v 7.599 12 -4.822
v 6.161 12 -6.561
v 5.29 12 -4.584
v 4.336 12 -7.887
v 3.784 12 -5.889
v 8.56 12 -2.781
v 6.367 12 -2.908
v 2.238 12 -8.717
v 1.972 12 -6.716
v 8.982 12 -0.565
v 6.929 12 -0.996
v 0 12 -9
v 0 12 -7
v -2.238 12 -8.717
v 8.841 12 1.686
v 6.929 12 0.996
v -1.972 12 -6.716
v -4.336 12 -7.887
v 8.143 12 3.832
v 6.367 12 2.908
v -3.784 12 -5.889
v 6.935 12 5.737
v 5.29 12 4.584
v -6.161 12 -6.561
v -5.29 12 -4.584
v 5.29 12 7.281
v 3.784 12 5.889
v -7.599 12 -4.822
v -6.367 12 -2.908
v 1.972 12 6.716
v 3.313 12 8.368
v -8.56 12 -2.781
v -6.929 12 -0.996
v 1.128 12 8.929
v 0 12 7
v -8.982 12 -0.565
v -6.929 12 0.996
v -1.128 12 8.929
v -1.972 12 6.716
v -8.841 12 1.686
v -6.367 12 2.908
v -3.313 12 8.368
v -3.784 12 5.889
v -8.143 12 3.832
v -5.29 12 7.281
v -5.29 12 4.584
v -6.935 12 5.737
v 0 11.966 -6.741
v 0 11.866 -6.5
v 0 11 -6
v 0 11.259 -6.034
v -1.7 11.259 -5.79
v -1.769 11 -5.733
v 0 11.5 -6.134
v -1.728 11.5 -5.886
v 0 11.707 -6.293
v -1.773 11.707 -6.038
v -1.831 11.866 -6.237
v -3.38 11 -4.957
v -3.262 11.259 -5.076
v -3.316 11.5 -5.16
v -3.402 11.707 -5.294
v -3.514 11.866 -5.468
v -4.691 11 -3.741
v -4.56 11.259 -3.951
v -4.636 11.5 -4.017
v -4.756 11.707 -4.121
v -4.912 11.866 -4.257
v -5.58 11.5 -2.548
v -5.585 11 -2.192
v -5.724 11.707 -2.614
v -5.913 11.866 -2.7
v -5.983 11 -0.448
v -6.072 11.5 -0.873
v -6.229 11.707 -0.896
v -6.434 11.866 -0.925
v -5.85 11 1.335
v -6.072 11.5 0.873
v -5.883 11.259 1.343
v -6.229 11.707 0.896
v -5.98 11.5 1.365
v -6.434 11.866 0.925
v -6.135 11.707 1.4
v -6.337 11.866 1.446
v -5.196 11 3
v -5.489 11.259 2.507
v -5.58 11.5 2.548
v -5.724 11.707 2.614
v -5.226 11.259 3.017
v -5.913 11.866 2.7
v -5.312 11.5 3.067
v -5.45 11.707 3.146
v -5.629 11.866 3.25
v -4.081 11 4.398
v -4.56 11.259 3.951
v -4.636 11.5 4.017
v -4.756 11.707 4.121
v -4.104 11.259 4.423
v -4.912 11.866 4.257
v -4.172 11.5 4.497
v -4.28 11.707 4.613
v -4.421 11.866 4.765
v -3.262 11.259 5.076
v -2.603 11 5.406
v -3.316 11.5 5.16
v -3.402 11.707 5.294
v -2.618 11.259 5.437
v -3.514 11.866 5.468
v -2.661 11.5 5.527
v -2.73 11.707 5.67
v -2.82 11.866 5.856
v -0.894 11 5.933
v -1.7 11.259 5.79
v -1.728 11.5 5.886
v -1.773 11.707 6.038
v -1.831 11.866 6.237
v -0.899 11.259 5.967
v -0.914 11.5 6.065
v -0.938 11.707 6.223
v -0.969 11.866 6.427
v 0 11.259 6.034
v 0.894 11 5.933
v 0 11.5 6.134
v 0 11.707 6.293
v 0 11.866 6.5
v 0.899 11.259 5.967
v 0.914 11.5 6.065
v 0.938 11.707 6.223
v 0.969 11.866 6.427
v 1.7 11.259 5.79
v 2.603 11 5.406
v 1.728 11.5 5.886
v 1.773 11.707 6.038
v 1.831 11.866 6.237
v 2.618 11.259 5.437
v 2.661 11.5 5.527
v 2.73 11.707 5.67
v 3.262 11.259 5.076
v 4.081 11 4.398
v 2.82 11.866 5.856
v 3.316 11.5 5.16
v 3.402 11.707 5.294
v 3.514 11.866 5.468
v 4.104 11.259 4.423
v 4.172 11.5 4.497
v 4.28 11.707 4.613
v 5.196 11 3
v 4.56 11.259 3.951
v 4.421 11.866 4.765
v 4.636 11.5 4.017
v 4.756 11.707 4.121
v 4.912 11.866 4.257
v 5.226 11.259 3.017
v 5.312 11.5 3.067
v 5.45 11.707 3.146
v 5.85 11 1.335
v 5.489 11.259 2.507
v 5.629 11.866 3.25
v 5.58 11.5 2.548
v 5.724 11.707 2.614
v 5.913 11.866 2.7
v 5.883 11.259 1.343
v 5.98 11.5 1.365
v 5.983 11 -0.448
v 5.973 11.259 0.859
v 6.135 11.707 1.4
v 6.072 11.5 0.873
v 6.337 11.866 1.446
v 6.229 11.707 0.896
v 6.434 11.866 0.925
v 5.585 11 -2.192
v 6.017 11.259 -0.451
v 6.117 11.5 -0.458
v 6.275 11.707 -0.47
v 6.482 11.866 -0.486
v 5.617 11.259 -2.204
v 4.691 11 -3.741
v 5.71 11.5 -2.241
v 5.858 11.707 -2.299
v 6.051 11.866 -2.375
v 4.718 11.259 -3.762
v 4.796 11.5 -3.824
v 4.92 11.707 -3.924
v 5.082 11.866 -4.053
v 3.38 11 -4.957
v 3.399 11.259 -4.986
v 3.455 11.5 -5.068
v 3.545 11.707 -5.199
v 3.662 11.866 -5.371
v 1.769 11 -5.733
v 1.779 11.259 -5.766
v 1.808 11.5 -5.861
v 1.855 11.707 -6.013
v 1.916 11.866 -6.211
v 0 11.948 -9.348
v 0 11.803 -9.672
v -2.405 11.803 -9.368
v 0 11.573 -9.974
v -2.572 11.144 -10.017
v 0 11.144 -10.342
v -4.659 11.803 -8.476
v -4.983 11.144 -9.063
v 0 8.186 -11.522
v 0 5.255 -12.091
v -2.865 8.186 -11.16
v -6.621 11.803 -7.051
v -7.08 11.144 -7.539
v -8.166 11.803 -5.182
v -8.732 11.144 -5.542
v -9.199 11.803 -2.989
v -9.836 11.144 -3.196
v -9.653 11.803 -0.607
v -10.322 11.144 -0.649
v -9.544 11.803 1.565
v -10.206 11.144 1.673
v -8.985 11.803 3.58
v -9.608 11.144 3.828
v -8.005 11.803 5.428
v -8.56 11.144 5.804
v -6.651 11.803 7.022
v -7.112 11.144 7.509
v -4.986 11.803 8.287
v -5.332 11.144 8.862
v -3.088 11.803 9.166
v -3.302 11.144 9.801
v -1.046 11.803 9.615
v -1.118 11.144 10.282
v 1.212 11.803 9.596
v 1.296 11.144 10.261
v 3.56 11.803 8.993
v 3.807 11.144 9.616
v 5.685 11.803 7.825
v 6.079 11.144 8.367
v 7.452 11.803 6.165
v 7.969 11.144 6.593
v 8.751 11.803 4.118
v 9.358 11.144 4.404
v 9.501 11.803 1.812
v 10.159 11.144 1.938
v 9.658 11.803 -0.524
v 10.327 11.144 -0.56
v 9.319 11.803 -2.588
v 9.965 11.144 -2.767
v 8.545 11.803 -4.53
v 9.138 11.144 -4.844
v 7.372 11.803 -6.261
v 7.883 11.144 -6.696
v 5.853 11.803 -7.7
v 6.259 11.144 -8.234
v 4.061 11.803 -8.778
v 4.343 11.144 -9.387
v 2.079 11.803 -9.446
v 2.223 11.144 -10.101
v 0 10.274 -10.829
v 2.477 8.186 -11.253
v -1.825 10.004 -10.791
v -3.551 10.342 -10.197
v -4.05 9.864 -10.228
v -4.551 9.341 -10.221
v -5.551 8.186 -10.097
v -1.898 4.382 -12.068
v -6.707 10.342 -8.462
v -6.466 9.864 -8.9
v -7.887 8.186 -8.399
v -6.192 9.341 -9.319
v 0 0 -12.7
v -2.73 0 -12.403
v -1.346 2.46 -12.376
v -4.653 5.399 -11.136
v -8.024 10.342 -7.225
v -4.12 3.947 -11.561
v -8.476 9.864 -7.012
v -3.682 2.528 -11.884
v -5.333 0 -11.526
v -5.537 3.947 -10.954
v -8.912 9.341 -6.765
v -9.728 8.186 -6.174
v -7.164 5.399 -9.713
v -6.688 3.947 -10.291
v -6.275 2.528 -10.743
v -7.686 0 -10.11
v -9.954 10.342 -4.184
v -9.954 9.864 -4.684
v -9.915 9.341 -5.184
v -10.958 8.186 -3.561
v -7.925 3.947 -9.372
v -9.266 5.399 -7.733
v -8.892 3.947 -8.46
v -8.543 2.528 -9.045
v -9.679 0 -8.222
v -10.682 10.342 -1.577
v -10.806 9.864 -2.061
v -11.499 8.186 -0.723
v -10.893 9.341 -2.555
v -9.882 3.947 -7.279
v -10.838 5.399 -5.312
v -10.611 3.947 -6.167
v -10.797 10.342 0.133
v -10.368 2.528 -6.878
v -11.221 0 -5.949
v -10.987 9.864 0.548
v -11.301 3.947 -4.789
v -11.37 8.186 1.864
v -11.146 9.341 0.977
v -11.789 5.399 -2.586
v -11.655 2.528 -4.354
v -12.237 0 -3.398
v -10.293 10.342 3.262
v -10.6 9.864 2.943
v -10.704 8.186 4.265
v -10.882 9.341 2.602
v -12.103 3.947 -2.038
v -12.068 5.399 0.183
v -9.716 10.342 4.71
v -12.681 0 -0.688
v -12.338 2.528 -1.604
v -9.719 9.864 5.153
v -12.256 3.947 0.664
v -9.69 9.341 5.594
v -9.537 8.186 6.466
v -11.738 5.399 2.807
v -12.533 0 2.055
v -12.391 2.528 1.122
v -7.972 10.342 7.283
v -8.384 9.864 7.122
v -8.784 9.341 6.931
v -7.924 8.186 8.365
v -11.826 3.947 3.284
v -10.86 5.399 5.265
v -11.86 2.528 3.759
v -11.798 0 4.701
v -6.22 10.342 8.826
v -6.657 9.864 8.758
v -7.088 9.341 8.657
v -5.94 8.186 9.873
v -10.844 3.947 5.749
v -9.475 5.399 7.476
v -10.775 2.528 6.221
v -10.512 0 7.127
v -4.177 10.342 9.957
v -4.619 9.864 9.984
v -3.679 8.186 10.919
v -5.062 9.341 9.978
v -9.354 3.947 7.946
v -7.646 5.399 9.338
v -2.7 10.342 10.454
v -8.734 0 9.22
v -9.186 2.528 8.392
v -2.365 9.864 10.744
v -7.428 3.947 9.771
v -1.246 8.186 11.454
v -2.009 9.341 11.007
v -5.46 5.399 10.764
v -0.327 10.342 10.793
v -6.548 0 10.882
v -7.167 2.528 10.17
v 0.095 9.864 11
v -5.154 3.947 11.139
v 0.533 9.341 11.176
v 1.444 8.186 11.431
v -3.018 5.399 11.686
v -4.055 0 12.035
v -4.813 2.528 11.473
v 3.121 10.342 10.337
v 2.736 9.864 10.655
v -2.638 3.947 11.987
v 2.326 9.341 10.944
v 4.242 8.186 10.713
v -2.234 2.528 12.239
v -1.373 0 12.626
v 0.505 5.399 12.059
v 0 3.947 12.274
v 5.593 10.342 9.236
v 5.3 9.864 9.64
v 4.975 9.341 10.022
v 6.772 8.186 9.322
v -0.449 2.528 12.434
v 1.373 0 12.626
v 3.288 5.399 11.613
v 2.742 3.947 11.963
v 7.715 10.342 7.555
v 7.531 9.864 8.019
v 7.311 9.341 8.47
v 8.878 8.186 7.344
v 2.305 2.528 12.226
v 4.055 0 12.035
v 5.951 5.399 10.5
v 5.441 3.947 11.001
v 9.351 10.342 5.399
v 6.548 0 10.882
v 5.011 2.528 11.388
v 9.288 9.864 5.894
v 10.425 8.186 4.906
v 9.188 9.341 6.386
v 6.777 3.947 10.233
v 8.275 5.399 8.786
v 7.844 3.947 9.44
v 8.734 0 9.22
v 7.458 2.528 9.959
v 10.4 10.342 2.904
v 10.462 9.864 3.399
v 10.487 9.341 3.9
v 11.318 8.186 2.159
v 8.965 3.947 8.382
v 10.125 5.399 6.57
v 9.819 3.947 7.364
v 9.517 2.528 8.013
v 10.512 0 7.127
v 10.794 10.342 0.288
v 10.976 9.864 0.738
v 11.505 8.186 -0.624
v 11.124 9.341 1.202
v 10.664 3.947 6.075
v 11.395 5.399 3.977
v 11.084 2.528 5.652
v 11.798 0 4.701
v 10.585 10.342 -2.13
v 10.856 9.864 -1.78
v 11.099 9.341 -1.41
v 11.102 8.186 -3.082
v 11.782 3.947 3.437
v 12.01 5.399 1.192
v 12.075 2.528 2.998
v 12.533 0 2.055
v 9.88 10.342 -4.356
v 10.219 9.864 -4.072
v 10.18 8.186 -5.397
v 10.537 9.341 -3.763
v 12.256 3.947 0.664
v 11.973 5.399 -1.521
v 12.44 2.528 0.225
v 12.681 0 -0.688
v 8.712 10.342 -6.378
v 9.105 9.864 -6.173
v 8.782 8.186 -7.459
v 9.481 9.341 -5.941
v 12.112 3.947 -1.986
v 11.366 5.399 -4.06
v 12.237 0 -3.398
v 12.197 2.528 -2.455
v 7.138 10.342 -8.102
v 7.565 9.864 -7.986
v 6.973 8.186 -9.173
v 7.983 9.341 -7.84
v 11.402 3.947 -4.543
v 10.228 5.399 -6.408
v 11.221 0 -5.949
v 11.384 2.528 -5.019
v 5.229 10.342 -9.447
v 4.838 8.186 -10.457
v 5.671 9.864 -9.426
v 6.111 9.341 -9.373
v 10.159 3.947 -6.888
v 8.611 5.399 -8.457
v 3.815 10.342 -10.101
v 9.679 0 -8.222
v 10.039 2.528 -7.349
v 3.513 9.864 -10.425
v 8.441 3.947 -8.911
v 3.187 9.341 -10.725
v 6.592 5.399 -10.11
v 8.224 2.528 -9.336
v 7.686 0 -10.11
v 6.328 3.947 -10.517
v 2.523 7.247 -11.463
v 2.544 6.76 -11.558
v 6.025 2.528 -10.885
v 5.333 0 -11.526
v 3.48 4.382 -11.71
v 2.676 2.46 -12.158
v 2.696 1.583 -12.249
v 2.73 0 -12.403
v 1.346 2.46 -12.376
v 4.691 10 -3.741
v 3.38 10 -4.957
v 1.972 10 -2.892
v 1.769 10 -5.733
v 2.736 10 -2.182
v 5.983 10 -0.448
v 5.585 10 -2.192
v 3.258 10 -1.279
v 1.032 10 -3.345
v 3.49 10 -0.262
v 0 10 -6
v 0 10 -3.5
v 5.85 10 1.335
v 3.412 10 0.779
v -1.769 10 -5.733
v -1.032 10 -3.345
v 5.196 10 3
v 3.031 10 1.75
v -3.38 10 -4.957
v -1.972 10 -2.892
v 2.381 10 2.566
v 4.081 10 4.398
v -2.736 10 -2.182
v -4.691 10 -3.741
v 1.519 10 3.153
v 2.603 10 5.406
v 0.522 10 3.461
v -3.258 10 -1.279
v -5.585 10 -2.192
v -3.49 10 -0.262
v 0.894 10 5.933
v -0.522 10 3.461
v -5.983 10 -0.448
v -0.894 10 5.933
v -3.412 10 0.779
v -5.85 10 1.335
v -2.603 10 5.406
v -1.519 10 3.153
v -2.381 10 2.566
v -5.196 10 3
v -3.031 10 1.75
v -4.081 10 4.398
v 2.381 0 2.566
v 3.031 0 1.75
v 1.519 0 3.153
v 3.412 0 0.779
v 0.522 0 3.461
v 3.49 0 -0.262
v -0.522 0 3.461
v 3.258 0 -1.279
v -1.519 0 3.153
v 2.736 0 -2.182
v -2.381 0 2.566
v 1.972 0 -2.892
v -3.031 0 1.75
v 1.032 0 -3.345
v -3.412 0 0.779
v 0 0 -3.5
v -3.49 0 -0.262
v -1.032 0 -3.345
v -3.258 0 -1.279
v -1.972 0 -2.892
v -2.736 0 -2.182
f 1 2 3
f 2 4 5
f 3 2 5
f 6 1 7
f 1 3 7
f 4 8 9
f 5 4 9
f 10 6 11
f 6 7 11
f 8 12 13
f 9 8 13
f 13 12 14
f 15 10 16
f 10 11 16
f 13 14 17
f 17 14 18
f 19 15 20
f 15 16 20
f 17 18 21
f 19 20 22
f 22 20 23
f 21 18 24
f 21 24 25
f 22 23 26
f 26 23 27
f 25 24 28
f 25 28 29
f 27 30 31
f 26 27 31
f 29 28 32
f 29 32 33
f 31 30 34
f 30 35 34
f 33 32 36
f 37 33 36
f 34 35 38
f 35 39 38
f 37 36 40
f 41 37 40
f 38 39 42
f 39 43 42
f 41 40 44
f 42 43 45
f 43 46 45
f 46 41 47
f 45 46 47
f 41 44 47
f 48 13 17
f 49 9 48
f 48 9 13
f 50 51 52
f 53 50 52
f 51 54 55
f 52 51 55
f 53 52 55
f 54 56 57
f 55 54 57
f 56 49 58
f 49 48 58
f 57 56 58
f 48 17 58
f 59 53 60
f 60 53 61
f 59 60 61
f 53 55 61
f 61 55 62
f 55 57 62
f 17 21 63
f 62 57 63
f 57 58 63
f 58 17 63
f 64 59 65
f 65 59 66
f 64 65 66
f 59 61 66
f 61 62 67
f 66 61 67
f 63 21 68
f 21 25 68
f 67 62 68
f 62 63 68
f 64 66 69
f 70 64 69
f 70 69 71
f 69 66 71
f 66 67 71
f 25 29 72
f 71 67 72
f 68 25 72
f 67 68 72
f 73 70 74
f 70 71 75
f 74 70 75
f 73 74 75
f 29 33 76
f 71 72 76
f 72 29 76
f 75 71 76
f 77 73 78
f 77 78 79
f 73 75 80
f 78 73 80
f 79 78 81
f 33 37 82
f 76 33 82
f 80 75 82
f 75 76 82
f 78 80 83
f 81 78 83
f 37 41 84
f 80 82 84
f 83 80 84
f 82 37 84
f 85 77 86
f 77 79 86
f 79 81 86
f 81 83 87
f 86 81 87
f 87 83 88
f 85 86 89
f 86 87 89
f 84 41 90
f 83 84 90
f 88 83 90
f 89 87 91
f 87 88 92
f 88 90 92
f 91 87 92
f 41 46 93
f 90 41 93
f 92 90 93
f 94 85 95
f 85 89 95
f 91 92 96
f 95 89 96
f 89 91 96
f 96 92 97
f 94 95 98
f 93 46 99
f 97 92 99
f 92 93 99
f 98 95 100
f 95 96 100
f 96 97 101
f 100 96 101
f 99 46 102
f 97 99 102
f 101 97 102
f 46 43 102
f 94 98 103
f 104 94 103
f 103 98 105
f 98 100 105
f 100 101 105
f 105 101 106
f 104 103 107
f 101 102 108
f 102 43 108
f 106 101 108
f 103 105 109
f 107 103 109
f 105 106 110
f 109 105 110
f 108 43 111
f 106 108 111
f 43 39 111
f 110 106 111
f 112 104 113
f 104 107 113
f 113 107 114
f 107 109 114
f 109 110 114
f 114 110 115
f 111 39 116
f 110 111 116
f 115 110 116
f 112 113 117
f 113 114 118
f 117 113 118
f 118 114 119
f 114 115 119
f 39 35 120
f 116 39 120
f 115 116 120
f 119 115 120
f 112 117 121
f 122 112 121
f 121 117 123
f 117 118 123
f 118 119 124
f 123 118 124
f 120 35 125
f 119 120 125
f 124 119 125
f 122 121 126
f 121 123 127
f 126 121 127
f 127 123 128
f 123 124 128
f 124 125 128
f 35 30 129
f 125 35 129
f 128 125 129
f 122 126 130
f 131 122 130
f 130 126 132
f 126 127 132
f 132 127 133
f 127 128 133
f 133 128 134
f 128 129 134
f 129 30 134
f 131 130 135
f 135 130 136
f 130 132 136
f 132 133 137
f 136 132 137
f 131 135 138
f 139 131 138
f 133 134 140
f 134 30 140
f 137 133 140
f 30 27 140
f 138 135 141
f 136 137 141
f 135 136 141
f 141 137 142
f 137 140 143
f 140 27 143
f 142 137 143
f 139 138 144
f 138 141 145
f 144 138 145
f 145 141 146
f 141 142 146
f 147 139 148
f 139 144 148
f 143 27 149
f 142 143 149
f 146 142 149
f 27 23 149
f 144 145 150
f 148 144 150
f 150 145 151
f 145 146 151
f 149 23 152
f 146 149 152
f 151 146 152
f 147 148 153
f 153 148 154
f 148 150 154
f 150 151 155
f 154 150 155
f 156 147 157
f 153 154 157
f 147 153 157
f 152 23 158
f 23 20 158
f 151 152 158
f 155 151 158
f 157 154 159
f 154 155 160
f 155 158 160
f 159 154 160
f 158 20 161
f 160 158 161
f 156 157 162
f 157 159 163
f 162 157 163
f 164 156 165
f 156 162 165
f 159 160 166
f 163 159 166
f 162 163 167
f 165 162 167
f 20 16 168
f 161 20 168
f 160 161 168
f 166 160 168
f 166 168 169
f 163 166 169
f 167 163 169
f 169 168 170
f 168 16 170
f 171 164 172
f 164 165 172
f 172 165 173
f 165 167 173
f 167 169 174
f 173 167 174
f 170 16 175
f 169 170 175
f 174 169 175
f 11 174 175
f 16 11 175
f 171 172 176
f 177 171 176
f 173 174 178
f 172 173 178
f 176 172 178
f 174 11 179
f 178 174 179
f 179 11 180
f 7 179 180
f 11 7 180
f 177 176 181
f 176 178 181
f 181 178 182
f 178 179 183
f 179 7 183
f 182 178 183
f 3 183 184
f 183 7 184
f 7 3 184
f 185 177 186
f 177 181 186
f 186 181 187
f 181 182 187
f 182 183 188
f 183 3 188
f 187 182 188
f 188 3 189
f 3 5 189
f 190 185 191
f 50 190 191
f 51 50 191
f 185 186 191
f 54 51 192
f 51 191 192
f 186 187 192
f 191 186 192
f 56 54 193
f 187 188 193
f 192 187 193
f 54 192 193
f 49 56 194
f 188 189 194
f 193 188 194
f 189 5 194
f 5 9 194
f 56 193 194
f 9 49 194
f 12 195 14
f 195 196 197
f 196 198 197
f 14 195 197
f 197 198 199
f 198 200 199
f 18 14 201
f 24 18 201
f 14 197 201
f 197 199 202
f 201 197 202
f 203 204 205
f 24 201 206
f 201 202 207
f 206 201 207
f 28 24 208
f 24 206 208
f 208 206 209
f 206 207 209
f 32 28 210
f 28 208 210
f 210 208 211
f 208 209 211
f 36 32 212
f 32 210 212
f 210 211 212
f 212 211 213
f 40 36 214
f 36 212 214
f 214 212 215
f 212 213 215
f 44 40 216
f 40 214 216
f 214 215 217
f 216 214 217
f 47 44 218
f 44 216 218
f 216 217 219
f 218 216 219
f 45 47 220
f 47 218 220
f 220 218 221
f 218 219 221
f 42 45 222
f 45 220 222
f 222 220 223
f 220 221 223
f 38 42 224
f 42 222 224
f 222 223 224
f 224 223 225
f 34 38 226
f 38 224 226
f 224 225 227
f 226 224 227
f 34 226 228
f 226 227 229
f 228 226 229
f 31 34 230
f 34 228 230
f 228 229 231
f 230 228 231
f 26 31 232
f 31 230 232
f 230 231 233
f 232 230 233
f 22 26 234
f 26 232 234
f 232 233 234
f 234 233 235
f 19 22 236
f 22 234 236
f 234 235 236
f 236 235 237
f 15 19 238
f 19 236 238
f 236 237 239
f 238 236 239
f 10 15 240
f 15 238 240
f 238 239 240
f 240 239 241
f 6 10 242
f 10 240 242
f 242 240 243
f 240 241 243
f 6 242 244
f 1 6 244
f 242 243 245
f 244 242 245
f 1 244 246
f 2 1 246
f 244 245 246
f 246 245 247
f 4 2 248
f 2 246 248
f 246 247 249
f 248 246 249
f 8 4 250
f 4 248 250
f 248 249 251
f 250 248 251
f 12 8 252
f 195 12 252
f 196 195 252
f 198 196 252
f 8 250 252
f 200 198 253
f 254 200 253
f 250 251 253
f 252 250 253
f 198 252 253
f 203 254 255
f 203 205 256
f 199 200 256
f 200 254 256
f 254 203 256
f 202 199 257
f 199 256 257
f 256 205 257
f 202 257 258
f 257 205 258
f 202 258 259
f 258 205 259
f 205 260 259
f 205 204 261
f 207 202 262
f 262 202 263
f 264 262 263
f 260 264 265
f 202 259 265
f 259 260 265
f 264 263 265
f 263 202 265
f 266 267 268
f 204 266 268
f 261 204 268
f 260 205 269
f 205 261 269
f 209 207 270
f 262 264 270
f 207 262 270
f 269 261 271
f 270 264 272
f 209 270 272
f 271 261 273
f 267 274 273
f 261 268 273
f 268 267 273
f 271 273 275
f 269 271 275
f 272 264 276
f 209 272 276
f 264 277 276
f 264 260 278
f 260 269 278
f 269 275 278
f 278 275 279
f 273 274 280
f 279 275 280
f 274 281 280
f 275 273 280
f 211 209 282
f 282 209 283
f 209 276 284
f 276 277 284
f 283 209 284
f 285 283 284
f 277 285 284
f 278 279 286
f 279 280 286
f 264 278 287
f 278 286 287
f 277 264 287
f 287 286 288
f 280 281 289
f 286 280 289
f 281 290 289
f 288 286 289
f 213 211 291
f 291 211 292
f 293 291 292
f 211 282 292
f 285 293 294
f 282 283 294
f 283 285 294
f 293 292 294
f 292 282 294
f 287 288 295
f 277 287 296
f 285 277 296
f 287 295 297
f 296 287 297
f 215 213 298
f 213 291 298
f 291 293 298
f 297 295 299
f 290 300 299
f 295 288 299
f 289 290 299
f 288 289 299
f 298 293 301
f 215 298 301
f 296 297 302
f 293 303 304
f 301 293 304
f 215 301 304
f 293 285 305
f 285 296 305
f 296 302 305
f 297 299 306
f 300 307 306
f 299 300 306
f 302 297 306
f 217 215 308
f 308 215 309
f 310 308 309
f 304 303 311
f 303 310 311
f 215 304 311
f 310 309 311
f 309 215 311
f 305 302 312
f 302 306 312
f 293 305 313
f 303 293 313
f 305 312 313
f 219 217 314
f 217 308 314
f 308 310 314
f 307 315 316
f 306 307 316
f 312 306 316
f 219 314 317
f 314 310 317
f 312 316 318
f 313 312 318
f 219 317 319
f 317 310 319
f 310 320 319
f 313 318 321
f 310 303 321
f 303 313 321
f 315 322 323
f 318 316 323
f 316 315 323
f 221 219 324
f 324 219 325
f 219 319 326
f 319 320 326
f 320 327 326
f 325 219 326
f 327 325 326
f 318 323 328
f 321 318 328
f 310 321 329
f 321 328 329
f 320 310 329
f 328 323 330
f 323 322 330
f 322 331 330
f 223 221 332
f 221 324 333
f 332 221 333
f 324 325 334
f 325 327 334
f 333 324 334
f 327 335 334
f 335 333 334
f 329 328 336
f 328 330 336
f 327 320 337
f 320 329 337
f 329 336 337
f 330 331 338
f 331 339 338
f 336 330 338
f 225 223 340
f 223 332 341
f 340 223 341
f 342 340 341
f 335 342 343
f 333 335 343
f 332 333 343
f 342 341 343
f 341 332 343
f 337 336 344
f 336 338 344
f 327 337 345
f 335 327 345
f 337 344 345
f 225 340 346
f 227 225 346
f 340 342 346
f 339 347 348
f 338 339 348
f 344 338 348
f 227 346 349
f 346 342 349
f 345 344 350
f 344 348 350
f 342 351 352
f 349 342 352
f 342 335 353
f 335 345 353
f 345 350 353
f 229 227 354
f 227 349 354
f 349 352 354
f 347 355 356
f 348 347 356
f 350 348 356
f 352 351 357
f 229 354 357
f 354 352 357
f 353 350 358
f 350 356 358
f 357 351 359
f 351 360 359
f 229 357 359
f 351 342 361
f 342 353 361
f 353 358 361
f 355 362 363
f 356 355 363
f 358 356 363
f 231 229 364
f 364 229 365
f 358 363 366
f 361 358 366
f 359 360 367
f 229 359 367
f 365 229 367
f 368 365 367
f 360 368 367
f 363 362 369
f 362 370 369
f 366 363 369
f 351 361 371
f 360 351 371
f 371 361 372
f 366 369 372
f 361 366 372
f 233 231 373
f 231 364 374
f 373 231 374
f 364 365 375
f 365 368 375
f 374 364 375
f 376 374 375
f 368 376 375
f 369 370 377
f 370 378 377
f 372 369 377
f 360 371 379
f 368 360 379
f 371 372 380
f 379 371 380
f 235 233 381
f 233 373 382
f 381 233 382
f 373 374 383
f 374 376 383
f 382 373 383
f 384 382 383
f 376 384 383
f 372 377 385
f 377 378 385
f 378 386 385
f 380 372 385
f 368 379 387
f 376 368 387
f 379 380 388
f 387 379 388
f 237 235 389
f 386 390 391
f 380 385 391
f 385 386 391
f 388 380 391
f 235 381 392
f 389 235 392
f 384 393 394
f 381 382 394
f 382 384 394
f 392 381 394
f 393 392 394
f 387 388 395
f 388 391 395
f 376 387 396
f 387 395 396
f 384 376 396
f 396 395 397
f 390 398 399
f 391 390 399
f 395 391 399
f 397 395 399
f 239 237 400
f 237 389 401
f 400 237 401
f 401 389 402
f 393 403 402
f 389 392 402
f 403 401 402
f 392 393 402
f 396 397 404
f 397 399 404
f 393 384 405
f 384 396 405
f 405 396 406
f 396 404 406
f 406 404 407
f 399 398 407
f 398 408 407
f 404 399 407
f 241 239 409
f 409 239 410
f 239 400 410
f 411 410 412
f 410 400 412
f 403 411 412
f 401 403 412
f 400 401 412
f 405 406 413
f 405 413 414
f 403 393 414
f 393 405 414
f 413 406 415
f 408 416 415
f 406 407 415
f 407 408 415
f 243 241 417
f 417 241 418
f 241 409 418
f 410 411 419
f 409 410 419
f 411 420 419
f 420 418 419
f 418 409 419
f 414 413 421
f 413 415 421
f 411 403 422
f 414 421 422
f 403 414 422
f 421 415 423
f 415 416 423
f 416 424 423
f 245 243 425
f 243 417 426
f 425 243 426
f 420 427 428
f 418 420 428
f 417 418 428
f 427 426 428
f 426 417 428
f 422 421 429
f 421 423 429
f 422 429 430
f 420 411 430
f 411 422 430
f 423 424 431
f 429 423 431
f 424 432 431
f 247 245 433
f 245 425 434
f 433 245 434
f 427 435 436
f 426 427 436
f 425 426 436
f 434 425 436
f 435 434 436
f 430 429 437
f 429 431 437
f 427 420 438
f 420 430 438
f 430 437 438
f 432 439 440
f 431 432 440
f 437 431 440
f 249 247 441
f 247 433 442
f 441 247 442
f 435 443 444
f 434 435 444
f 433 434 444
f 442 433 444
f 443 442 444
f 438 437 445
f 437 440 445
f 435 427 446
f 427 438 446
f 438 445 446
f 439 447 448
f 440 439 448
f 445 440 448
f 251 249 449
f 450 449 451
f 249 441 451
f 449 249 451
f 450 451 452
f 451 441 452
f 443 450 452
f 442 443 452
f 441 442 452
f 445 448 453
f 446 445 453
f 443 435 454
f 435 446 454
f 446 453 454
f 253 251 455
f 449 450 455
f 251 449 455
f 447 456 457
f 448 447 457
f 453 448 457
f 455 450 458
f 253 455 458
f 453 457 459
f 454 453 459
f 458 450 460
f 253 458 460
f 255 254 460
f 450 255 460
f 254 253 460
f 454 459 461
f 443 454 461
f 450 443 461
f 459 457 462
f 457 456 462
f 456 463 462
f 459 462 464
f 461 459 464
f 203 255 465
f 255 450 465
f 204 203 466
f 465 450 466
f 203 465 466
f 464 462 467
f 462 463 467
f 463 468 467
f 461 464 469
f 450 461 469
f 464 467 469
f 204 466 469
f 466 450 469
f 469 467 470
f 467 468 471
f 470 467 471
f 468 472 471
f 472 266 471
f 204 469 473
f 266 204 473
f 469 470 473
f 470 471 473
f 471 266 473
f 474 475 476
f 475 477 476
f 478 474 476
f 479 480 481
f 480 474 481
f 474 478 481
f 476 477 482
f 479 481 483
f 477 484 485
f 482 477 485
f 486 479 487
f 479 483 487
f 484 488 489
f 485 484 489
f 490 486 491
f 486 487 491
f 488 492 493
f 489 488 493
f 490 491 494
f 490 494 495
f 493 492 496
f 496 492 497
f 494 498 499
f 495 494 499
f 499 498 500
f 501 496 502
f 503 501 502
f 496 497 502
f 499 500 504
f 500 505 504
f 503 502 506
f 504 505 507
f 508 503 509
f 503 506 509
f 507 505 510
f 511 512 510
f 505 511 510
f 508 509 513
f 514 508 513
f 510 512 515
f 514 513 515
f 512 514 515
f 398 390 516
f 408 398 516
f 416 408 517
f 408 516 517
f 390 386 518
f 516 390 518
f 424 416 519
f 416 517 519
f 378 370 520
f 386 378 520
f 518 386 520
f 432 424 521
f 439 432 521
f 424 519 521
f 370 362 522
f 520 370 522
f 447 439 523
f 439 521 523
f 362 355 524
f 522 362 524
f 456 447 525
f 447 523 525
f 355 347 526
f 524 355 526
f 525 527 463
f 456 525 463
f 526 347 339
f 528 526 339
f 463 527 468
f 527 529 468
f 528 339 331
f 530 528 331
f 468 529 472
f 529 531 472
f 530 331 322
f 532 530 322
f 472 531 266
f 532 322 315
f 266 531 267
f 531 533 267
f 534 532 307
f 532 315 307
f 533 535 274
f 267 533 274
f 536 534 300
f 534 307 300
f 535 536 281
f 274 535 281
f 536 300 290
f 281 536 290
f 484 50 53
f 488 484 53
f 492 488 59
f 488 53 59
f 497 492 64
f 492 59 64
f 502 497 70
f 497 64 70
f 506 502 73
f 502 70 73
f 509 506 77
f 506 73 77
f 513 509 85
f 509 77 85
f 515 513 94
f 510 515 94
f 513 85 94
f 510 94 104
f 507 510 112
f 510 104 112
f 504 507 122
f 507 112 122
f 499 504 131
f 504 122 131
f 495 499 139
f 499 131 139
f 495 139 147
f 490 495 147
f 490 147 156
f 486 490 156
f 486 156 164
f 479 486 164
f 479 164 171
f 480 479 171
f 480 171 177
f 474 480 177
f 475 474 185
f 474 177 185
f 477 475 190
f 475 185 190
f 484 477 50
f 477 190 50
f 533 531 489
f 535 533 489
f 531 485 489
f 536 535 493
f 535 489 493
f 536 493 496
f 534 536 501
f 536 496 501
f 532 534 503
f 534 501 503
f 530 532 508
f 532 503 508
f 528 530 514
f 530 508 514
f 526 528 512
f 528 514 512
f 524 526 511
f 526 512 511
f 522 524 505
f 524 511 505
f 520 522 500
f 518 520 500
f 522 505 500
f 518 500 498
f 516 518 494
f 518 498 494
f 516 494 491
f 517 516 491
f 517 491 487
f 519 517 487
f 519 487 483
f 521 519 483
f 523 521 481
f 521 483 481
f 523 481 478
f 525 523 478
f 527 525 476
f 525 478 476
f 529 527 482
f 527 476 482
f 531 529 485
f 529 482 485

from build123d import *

# Parameters (mm, degrees)
FILLET1_R = 1


with BuildPart() as part:
    # Sketch1 → Revolve1 (revolve)
    with BuildSketch(Plane.XY, mode=Mode.PRIVATE) as revolve1_sk:
        with BuildLine():
            Line((-12.7, 0), (-3.5, 0))
            Line((-3.5, 0), (-3.5, 10))
            Line((-3.5, 10), (-6, 10))
            Line((-6, 10), (-6, 12))
            Line((-6, 12), (-9, 12))
            add(Edge.make_bspline(
                [(-9, 12), (-11.619977791, 11.972530127), (-12.294490853, 4.057777416), (-12.7, 0)],
                knots=[0, 0, 0, 0, 1, 1, 1, 1], degree=3))
        make_face()
    revolve(revolve1_sk.sketch.rotate(Axis((0, 0, 0), (0, 1, 0)), 270), axis=Axis((0, 0, 0), (0, 1, 0)))

    # Fillet1
    fillet1_edges = [part.edges().sort_by_distance(p)[0] for p in [
        (0, 12, 6),
    ]]
    fillet(fillet1_edges, radius=FILLET1_R)


solid = part.part
